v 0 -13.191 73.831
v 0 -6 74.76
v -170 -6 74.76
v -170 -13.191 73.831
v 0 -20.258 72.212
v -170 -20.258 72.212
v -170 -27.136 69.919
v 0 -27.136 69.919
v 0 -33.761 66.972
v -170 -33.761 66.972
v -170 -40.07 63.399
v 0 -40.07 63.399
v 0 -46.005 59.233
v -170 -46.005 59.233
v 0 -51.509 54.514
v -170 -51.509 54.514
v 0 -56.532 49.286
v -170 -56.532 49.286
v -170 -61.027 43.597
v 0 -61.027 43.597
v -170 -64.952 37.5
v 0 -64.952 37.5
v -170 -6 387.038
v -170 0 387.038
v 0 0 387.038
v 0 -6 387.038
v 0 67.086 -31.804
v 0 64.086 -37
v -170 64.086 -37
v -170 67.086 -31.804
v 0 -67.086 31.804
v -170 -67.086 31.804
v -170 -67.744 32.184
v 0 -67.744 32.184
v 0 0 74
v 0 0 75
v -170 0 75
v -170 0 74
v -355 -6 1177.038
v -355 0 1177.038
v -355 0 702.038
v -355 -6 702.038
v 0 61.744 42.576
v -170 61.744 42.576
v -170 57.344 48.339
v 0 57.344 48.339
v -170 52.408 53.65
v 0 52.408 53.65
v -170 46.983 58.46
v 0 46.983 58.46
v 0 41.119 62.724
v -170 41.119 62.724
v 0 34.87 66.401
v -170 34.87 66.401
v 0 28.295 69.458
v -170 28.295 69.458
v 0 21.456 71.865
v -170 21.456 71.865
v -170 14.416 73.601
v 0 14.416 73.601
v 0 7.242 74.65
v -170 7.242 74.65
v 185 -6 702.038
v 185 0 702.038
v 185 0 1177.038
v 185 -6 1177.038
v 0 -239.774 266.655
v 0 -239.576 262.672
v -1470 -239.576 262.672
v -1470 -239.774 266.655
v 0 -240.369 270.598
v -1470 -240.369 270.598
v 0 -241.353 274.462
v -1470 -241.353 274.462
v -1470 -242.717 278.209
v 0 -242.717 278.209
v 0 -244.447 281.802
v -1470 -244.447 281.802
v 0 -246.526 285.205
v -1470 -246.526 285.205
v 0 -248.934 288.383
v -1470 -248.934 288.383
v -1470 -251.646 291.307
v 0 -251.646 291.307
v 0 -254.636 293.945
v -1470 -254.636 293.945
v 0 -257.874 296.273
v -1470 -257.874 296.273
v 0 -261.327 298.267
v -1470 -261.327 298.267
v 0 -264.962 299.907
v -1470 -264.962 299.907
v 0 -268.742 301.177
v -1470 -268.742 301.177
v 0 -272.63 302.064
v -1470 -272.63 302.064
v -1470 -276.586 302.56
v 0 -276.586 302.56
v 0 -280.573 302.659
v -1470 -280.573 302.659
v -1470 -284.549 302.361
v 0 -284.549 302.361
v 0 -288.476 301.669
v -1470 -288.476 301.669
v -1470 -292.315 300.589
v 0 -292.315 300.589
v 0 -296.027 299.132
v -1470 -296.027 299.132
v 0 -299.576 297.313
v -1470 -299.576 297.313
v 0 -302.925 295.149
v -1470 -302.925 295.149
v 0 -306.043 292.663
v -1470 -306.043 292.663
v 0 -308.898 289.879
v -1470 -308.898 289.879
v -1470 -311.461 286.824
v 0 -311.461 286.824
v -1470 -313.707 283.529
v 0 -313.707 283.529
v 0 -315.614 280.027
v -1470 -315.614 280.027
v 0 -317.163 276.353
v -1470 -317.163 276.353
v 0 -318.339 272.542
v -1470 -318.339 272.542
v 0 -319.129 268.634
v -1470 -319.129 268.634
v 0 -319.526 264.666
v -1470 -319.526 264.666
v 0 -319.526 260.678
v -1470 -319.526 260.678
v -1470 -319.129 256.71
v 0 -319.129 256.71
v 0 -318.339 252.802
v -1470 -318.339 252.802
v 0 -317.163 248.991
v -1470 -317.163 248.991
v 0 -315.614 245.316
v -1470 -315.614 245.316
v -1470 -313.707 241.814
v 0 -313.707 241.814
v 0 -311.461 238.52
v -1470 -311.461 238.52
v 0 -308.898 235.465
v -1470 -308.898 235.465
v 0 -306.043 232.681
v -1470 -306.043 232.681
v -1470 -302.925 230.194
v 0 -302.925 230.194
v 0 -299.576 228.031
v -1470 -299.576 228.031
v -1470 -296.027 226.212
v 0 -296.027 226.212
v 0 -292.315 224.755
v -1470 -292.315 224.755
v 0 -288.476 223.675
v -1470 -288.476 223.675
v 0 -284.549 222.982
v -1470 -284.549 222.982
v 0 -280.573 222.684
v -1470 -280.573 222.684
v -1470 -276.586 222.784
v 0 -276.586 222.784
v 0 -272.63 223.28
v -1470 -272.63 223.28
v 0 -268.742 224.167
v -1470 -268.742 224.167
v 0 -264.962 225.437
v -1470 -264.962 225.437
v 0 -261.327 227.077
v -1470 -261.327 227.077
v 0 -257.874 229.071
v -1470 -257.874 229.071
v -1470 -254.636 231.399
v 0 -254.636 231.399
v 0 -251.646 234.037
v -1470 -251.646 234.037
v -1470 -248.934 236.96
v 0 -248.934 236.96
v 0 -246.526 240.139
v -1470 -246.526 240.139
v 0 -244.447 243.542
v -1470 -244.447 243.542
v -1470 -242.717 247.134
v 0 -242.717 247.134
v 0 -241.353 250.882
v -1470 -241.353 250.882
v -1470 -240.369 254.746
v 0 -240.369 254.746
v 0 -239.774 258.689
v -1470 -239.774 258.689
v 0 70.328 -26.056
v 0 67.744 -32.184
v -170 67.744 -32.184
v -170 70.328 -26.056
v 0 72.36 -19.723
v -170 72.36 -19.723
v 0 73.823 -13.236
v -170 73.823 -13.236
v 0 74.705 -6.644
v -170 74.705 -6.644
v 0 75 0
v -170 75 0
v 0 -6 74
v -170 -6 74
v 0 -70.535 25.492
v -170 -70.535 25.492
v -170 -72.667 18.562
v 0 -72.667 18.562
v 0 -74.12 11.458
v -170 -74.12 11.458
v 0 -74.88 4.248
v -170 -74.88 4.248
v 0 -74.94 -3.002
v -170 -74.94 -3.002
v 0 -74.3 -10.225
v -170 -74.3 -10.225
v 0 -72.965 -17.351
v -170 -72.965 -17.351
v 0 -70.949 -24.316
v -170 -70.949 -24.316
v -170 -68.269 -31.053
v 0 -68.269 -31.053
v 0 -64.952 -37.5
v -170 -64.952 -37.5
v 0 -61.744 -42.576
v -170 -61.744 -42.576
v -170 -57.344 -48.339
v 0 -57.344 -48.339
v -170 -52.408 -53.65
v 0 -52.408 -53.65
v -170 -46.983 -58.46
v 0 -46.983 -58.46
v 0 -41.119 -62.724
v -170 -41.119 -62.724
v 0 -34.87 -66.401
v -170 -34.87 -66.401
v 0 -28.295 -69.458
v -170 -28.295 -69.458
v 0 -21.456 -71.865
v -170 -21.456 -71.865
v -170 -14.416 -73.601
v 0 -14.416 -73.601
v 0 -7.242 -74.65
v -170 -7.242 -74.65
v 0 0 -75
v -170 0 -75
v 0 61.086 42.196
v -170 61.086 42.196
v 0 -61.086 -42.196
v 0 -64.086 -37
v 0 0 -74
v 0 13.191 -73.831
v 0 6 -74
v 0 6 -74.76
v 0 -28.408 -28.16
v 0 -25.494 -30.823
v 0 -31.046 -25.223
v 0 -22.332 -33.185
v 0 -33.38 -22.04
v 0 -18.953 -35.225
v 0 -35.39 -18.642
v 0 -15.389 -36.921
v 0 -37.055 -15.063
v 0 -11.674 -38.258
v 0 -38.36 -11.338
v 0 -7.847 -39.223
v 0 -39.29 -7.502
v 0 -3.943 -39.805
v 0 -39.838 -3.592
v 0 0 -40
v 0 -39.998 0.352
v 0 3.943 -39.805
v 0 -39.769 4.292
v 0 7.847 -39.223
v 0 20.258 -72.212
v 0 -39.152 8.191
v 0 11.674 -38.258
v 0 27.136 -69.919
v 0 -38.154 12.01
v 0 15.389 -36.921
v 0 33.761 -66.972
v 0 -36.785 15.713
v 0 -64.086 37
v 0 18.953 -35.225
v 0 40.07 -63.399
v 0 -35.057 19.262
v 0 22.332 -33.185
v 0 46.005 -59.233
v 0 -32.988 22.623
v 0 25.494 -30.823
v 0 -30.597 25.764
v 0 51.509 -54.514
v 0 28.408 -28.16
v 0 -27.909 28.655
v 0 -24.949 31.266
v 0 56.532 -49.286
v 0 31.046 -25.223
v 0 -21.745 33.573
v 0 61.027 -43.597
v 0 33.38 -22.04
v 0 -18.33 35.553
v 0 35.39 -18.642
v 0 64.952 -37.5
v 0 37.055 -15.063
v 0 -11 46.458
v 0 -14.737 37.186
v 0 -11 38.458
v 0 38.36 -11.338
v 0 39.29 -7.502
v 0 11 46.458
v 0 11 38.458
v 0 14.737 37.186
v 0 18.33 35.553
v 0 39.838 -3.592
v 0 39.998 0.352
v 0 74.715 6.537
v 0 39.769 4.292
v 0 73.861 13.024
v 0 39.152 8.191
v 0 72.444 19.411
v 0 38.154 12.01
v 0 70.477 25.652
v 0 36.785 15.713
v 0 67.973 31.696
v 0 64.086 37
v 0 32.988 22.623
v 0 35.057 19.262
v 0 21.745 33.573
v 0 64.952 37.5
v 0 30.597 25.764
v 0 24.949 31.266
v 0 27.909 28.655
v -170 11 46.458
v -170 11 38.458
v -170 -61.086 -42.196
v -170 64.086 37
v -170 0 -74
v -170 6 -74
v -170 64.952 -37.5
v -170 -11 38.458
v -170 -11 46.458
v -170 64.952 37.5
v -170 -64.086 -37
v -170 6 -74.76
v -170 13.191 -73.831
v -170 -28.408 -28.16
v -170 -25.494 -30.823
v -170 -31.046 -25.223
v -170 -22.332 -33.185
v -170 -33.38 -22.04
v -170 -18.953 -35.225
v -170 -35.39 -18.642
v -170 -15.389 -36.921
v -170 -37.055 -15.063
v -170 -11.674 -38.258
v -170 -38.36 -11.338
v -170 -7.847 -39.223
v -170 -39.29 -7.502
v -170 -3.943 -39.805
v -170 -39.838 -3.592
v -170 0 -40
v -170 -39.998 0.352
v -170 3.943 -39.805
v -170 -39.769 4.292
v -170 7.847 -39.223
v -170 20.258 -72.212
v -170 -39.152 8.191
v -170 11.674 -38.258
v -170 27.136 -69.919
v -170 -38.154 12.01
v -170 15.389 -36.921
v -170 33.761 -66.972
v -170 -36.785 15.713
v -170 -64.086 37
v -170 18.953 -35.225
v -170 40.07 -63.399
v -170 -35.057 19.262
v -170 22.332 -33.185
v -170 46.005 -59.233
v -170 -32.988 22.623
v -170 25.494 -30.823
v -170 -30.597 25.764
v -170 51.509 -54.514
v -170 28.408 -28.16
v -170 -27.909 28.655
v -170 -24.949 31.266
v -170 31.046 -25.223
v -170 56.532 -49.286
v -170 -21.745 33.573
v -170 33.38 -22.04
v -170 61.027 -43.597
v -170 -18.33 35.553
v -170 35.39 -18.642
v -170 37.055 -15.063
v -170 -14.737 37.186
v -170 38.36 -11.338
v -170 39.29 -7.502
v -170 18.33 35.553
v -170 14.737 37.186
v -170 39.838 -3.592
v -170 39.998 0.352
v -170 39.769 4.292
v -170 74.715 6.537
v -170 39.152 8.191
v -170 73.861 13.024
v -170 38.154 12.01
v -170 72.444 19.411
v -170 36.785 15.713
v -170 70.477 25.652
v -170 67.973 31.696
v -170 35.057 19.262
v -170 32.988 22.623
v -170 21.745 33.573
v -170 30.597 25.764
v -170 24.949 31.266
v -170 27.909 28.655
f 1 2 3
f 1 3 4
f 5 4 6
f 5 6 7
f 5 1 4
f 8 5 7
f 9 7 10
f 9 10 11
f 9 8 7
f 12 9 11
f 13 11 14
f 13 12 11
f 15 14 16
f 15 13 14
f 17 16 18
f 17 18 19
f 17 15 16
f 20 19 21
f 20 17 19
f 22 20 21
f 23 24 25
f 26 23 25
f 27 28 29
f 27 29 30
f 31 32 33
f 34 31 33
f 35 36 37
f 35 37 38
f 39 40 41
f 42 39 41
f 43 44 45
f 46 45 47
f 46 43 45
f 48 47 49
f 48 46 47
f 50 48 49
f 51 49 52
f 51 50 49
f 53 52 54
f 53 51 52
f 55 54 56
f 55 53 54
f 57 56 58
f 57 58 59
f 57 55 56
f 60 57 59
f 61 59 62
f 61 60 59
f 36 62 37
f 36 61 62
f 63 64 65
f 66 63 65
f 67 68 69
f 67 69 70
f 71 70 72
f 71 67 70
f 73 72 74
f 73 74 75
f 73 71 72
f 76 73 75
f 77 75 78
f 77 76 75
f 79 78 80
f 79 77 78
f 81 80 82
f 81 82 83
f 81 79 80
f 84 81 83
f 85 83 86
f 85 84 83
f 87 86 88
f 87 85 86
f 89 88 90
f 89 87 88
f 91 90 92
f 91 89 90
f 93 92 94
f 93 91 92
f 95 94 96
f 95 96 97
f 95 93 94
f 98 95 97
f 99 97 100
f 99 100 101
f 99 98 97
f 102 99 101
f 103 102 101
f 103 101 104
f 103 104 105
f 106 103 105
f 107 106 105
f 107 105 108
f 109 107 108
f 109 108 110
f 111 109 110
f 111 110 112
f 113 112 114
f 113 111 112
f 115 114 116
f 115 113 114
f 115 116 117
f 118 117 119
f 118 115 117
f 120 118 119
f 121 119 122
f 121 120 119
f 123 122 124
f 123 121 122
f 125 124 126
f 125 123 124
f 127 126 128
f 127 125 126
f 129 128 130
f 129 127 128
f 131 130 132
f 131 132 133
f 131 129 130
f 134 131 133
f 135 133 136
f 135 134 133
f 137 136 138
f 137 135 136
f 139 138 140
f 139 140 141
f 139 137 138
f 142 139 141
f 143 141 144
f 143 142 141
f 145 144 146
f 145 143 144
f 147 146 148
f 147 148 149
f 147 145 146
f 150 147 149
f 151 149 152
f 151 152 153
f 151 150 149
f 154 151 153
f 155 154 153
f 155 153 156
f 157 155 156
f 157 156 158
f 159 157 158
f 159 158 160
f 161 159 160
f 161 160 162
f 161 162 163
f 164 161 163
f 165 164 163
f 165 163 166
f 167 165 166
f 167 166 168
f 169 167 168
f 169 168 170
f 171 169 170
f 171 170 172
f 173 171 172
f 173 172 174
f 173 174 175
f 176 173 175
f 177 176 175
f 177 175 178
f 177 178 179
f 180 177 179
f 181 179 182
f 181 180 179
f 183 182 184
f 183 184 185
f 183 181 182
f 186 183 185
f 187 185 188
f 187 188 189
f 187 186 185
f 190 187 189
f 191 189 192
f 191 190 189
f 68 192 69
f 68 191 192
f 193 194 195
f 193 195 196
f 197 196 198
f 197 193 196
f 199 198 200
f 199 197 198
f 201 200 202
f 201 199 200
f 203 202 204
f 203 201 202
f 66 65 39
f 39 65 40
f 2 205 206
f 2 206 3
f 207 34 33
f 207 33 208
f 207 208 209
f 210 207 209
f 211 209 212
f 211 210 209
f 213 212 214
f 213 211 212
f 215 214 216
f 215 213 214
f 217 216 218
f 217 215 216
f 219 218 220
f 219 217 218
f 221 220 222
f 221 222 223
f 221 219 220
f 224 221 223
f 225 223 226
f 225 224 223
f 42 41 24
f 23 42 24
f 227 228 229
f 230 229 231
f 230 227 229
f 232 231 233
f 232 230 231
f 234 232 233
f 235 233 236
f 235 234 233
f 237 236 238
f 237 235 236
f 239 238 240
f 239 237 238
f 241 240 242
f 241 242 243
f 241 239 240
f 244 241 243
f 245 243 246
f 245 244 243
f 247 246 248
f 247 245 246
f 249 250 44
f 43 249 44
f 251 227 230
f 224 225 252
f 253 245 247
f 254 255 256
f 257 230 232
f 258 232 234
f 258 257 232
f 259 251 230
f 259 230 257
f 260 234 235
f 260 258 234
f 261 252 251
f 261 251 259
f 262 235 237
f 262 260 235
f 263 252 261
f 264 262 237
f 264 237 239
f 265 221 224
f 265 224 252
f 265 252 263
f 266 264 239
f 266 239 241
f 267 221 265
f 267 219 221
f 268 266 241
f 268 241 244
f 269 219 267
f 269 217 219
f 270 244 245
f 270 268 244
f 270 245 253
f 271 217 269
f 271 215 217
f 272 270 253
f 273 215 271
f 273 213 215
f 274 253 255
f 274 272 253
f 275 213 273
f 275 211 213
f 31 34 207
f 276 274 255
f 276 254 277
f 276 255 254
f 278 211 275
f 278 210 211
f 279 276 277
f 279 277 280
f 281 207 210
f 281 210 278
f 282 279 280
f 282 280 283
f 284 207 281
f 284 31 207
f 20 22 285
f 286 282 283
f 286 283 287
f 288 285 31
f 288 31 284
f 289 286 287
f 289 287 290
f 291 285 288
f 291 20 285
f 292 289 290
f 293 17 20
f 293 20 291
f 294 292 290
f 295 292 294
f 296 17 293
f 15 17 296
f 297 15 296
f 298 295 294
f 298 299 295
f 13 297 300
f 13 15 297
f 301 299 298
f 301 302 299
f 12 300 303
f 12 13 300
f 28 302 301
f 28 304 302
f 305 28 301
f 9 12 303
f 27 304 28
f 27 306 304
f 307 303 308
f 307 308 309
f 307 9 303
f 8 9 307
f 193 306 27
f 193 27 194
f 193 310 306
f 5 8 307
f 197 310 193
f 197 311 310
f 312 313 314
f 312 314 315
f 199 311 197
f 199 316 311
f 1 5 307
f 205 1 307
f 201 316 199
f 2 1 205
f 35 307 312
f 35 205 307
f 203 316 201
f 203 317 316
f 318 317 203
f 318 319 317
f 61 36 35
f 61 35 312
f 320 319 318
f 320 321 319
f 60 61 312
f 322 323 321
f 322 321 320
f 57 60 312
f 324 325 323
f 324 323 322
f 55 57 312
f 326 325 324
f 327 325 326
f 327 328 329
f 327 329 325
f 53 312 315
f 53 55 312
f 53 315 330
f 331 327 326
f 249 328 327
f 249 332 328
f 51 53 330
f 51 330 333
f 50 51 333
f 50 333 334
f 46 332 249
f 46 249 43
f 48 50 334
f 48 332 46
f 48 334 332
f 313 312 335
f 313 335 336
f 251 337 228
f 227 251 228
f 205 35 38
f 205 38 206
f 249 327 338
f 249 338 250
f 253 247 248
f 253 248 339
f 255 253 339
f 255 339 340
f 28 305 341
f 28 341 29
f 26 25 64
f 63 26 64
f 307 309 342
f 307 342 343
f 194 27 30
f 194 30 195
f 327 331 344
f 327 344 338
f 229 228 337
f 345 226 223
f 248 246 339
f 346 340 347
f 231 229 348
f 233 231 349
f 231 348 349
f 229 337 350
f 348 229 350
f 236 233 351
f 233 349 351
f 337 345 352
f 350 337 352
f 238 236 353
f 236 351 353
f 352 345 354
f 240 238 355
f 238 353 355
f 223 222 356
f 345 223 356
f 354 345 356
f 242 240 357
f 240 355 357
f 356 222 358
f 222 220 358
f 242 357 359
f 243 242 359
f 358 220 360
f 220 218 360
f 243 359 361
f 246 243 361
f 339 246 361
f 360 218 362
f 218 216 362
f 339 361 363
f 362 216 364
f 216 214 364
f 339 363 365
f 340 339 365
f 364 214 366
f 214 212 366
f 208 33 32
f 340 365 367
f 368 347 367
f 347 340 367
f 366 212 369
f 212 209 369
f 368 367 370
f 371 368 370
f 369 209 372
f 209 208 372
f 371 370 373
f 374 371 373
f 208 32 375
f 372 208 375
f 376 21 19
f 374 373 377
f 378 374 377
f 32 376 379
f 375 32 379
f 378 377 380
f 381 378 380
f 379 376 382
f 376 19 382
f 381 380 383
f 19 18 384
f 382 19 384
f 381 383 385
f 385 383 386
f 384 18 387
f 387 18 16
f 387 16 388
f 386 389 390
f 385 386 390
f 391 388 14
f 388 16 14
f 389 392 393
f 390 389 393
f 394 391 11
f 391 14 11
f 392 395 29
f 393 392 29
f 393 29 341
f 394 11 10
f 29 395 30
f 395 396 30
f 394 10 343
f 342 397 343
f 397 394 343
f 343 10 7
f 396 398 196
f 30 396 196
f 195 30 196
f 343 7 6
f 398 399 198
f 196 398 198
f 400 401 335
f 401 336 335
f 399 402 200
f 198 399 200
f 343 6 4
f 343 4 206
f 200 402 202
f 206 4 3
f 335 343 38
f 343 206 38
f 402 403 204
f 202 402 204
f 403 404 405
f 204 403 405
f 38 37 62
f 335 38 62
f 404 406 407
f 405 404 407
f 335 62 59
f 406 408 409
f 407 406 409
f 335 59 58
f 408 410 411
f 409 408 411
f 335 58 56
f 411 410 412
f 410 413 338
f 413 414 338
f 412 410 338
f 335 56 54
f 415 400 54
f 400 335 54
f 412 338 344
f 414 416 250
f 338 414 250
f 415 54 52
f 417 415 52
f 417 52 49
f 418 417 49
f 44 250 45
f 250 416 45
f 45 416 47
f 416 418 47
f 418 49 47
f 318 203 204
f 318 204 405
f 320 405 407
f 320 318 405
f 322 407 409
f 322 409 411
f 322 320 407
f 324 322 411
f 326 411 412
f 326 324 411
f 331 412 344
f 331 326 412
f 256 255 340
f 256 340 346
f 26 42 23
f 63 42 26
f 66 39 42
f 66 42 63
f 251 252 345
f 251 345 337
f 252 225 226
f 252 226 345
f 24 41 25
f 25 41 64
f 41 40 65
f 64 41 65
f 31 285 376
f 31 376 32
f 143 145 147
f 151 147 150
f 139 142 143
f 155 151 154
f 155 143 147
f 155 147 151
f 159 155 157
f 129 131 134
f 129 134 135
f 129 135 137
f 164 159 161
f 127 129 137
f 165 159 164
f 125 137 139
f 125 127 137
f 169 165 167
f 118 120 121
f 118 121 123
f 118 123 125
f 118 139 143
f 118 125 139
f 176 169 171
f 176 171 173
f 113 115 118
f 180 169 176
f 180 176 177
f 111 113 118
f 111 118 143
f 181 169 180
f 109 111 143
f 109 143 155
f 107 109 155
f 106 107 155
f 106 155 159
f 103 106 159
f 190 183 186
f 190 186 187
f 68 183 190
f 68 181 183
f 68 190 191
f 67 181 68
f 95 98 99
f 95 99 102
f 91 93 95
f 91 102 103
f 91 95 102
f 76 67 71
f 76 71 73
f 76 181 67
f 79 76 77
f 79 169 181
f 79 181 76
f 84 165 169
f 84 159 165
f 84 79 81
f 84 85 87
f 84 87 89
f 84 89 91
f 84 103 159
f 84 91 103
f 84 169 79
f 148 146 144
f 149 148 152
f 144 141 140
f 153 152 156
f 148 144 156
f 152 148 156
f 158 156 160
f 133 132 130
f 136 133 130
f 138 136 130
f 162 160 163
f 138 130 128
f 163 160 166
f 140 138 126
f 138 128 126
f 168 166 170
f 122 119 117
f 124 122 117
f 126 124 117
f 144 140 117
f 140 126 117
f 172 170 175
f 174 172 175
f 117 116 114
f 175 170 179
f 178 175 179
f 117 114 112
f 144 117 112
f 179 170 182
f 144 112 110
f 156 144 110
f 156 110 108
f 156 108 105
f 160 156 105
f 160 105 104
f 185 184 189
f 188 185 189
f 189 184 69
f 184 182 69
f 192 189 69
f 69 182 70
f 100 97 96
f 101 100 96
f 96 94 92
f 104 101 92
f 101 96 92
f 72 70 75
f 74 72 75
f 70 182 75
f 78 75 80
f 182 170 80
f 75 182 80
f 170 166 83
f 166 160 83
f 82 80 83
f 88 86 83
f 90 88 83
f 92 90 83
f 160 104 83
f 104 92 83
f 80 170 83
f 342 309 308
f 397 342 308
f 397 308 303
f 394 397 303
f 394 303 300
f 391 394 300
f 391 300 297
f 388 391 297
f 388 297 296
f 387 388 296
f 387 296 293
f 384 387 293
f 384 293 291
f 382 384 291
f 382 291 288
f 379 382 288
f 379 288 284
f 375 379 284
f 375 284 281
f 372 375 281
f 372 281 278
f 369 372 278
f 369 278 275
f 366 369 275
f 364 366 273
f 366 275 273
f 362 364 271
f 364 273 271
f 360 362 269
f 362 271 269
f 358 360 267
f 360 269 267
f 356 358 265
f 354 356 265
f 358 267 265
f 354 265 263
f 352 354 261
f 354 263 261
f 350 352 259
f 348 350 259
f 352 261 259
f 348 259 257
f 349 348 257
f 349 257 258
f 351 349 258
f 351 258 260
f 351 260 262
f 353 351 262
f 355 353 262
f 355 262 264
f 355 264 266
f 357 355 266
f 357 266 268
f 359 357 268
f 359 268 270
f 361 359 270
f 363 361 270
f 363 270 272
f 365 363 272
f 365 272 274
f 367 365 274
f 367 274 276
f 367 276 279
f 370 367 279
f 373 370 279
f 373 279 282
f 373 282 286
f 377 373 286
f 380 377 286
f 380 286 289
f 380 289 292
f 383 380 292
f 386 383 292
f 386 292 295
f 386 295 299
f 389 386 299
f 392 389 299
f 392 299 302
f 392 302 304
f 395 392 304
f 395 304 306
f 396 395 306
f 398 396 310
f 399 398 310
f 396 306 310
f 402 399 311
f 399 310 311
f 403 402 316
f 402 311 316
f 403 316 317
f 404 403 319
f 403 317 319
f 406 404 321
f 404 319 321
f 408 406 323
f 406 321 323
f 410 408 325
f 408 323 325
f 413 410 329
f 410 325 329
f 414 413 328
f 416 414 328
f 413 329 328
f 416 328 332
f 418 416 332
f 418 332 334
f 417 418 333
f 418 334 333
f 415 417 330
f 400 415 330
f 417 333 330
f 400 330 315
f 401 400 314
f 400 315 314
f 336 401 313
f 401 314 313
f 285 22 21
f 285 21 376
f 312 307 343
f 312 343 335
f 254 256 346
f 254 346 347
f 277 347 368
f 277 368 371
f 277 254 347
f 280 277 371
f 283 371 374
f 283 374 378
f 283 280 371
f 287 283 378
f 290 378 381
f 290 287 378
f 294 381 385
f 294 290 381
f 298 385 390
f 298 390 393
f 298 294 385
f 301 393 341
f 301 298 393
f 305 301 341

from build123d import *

# Parameters (mm, degrees)
F1_DEPTH = 6
F2_R     = 40
F3_DEPTH = 170
F5_DEPTH = 170
F6_R     = 40
F7_DEPTH = 1470


with BuildPart() as f1:
    # F0 (on Front) → F1 (new body)
    with BuildSketch(Plane.XZ):
        Polygon((-355, 702.038036), (-170, 387.038036), (0, 387.038036), (185, 702.038036), (185, 1177.038036), (-355, 1177.038036), align=None)
    extrude(amount=F1_DEPTH)


with BuildPart() as f3:
    # F2 (on Right) → F3 (new body)
    with BuildSketch(Plane.YZ):
        with BuildLine():
            ThreePointArc((67.743726, -32.183655), (73.163445, -16.495766), (75, 0))
            ThreePointArc((75, 0), (72.444437, 19.411428), (64.951905, 37.5))
            Line((64.951905, 37.5), (64.08588, 37))
            Line((64.08588, 37), (61.08588, 42.196152))
            Line((61.08588, 42.196152), (61.743726, 42.57596))
            ThreePointArc((61.743726, 42.57596), (34.869779, 66.401043), (0, 75))
            Line((0, 75), (0, 74))
            Line((0, 74), (-6, 74))
            Line((-6, 74), (-6, 74.759615))
            ThreePointArc((-6, 74.759615), (-40.0701, 63.398636), (-64.951905, 37.5))
            Line((-64.951905, 37.5), (-64.08588, 37))
            Line((-64.08588, 37), (-67.08588, 31.803848))
            Line((-67.08588, 31.803848), (-67.743726, 32.183655))
            ThreePointArc((-67.743726, 32.183655), (-74.93988, -3.002407), (-64.951905, -37.5))
            Line((-64.951905, -37.5), (-64.08588, -37))
            Line((-64.08588, -37), (-61.08588, -42.196152))
            Line((-61.08588, -42.196152), (-61.743726, -42.57596))
            ThreePointArc((-61.743726, -42.57596), (-34.869779, -66.401043), (0, -75))
            Line((0, -75), (0, -74))
            Line((0, -74), (6, -74))
            Line((6, -74), (6, -74.759615))
            ThreePointArc((6, -74.759615), (40.0701, -63.398636), (64.951905, -37.5))
            Line((64.951905, -37.5), (64.08588, -37))
            Line((64.08588, -37), (67.08588, -31.803848))
            Line((67.08588, -31.803848), (67.743726, -32.183655))
        make_face()
        Circle(F2_R, mode=Mode.SUBTRACT)
    extrude(amount=-F3_DEPTH)

    # F4 (on face) → F5 (cut)
    with BuildSketch(Plane(origin=(-170, 0, 0), x_dir=(0, -1, 0), z_dir=(-1, 0, 0))):
        with BuildLine():
            Line((-11, 46.457769), (-11, 38.457769))
            ThreePointArc((-11, 38.457769), (0, 40), (11, 38.457769))
            Line((11, 38.457769), (11, 46.457769))
            Line((11, 46.457769), (-11, 46.457769))
        make_face()
    extrude(amount=-F5_DEPTH, mode=Mode.SUBTRACT)


with BuildPart() as f7:
    # F6 (on Right) → F7 (new body)
    with BuildSketch(Plane.YZ):
        with Locations((-279.575586, 262.671828)):
            Circle(F6_R)
    extrude(amount=-F7_DEPTH)


solid = Compound([f1.part, f3.part, f7.part])
